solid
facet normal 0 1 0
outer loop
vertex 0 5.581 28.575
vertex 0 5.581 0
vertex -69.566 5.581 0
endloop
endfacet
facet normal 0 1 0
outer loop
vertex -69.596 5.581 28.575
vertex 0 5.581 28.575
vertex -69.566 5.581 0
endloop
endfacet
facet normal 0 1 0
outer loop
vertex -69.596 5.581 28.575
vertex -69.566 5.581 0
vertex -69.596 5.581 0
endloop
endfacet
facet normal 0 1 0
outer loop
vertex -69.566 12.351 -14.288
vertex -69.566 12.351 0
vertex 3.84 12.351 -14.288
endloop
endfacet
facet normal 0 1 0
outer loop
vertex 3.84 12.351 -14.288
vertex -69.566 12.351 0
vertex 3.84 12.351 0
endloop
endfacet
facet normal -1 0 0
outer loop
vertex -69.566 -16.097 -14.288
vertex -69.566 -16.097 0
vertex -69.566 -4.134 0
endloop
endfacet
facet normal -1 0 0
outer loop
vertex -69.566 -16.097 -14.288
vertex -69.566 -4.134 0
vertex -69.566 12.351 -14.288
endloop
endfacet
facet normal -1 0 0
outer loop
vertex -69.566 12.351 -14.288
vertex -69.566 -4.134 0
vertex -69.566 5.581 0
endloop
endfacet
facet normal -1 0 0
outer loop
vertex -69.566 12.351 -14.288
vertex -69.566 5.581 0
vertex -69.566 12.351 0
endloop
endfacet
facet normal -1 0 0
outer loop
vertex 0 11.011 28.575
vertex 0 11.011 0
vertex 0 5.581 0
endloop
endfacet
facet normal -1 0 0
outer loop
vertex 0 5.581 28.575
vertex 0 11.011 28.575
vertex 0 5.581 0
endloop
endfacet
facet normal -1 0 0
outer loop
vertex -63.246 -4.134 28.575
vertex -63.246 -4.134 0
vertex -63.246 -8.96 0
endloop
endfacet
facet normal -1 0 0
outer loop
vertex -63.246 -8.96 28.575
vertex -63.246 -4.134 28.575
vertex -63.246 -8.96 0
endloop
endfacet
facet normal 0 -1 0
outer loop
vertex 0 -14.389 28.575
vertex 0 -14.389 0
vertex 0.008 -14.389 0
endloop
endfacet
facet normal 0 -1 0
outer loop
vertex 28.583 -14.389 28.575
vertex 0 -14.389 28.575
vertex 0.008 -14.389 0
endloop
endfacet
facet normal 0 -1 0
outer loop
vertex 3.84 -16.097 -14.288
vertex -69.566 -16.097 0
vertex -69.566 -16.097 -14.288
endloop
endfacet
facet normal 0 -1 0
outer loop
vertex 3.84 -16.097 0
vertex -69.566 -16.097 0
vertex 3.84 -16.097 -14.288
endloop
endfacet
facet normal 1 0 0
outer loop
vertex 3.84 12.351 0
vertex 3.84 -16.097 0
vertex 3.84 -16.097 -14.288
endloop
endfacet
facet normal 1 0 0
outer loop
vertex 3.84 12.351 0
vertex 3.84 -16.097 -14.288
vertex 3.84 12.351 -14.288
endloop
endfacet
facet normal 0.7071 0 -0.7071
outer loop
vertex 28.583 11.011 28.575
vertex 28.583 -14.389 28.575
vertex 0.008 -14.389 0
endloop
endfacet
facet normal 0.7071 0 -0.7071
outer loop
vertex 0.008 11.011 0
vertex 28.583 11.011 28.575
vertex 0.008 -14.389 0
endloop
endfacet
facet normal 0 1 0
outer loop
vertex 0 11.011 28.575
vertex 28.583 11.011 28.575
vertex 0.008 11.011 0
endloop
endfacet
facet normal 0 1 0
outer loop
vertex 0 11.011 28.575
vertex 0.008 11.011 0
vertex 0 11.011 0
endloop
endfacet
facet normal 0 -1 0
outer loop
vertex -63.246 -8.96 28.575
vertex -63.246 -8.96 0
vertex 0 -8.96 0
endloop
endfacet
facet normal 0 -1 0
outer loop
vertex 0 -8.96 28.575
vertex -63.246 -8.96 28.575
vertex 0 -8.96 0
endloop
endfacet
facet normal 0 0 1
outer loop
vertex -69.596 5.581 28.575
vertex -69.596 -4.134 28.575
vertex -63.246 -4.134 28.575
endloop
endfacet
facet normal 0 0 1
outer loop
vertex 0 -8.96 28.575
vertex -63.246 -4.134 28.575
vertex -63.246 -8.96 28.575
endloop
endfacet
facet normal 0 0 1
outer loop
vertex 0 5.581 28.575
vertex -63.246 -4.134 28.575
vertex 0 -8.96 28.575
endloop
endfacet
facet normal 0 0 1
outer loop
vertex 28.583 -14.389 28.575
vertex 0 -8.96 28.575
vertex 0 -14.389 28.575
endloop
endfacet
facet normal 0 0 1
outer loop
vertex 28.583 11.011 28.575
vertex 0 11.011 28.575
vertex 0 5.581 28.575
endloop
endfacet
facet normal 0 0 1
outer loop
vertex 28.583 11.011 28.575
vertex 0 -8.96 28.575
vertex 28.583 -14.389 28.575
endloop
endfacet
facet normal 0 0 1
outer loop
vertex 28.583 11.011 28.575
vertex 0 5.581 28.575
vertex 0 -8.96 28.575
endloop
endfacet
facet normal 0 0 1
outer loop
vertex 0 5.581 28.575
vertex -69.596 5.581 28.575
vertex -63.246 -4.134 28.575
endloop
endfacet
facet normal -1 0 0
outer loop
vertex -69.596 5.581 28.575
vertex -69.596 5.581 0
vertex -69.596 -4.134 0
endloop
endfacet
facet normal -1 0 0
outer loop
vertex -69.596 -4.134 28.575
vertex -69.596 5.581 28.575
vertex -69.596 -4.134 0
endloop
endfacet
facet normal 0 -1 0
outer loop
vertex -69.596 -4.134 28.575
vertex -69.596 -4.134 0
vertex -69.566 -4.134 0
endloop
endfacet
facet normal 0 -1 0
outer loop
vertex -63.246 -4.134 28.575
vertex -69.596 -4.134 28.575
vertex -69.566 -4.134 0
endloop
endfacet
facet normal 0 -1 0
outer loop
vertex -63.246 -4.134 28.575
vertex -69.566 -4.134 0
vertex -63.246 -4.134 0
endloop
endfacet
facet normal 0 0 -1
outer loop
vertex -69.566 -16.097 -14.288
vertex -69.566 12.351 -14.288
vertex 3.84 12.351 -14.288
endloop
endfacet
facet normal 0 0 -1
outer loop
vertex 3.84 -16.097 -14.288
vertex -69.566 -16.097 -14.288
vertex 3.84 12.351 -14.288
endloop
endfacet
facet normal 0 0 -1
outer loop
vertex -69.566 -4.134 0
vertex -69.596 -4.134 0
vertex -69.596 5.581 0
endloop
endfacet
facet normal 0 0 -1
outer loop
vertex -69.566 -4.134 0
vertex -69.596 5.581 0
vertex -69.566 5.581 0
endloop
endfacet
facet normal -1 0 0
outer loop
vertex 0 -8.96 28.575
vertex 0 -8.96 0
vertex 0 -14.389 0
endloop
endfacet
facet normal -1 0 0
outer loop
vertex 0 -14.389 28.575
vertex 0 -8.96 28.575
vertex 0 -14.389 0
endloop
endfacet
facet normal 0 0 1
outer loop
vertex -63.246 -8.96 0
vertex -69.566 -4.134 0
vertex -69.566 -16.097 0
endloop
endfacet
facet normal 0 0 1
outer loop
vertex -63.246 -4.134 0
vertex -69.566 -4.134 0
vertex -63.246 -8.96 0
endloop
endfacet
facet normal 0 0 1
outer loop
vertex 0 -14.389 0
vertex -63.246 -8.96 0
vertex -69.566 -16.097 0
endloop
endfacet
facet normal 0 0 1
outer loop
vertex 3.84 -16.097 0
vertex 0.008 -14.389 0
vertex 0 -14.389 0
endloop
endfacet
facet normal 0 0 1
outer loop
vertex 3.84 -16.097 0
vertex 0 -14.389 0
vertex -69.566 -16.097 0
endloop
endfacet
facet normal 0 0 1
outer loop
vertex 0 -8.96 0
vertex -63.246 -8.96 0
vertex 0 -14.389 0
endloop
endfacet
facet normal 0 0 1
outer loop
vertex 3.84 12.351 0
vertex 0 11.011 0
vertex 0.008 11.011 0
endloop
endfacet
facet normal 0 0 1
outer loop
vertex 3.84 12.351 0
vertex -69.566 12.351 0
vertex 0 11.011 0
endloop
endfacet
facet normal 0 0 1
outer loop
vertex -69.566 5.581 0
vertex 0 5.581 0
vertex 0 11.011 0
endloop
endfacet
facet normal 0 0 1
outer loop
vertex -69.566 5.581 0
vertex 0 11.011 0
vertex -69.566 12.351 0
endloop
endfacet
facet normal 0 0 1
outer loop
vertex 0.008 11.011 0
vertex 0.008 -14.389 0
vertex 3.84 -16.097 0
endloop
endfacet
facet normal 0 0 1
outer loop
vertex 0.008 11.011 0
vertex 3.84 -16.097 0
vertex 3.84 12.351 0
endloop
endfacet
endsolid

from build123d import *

# Parameters (mm, degrees)
F1_DEPTH = 28.575
F2_W     = 73.406
F2_H     = 28.448
F3_DEPTH = 14.2875
F5_DEPTH = 26.741029


with BuildPart() as f1:
    # F0 (on Top) → F1 (new body)
    with BuildSketch(Plane.XY):
        Polygon((0, -14.389101), (28.583242, -14.389101), (28.583242, 11.010899), (0, 11.010899), (0, 5.581491), (-69.596, 5.581491), (-69.596, -4.133693), (-63.246, -4.133693), (-63.246, -8.959693), (0, -8.959693), align=None)
    extrude(amount=F1_DEPTH)

    # F2 (on Top) → F3 (join)
    with BuildSketch(Plane.XY):
        with Locations((-32.863217, -1.873072)):
            Rectangle(F2_W, F2_H)
    extrude(amount=-F3_DEPTH)

    # F4 (on face) → F5 (cut, through all)
    with BuildSketch(Plane.XZ.offset(14.389101)):
        Polygon((28.583242, 0), (28.583242, 28.575), (0.008242, 0), (3.839783, 0), align=None)
    extrude(amount=-F5_DEPTH, mode=Mode.SUBTRACT)


solid = f1.part
